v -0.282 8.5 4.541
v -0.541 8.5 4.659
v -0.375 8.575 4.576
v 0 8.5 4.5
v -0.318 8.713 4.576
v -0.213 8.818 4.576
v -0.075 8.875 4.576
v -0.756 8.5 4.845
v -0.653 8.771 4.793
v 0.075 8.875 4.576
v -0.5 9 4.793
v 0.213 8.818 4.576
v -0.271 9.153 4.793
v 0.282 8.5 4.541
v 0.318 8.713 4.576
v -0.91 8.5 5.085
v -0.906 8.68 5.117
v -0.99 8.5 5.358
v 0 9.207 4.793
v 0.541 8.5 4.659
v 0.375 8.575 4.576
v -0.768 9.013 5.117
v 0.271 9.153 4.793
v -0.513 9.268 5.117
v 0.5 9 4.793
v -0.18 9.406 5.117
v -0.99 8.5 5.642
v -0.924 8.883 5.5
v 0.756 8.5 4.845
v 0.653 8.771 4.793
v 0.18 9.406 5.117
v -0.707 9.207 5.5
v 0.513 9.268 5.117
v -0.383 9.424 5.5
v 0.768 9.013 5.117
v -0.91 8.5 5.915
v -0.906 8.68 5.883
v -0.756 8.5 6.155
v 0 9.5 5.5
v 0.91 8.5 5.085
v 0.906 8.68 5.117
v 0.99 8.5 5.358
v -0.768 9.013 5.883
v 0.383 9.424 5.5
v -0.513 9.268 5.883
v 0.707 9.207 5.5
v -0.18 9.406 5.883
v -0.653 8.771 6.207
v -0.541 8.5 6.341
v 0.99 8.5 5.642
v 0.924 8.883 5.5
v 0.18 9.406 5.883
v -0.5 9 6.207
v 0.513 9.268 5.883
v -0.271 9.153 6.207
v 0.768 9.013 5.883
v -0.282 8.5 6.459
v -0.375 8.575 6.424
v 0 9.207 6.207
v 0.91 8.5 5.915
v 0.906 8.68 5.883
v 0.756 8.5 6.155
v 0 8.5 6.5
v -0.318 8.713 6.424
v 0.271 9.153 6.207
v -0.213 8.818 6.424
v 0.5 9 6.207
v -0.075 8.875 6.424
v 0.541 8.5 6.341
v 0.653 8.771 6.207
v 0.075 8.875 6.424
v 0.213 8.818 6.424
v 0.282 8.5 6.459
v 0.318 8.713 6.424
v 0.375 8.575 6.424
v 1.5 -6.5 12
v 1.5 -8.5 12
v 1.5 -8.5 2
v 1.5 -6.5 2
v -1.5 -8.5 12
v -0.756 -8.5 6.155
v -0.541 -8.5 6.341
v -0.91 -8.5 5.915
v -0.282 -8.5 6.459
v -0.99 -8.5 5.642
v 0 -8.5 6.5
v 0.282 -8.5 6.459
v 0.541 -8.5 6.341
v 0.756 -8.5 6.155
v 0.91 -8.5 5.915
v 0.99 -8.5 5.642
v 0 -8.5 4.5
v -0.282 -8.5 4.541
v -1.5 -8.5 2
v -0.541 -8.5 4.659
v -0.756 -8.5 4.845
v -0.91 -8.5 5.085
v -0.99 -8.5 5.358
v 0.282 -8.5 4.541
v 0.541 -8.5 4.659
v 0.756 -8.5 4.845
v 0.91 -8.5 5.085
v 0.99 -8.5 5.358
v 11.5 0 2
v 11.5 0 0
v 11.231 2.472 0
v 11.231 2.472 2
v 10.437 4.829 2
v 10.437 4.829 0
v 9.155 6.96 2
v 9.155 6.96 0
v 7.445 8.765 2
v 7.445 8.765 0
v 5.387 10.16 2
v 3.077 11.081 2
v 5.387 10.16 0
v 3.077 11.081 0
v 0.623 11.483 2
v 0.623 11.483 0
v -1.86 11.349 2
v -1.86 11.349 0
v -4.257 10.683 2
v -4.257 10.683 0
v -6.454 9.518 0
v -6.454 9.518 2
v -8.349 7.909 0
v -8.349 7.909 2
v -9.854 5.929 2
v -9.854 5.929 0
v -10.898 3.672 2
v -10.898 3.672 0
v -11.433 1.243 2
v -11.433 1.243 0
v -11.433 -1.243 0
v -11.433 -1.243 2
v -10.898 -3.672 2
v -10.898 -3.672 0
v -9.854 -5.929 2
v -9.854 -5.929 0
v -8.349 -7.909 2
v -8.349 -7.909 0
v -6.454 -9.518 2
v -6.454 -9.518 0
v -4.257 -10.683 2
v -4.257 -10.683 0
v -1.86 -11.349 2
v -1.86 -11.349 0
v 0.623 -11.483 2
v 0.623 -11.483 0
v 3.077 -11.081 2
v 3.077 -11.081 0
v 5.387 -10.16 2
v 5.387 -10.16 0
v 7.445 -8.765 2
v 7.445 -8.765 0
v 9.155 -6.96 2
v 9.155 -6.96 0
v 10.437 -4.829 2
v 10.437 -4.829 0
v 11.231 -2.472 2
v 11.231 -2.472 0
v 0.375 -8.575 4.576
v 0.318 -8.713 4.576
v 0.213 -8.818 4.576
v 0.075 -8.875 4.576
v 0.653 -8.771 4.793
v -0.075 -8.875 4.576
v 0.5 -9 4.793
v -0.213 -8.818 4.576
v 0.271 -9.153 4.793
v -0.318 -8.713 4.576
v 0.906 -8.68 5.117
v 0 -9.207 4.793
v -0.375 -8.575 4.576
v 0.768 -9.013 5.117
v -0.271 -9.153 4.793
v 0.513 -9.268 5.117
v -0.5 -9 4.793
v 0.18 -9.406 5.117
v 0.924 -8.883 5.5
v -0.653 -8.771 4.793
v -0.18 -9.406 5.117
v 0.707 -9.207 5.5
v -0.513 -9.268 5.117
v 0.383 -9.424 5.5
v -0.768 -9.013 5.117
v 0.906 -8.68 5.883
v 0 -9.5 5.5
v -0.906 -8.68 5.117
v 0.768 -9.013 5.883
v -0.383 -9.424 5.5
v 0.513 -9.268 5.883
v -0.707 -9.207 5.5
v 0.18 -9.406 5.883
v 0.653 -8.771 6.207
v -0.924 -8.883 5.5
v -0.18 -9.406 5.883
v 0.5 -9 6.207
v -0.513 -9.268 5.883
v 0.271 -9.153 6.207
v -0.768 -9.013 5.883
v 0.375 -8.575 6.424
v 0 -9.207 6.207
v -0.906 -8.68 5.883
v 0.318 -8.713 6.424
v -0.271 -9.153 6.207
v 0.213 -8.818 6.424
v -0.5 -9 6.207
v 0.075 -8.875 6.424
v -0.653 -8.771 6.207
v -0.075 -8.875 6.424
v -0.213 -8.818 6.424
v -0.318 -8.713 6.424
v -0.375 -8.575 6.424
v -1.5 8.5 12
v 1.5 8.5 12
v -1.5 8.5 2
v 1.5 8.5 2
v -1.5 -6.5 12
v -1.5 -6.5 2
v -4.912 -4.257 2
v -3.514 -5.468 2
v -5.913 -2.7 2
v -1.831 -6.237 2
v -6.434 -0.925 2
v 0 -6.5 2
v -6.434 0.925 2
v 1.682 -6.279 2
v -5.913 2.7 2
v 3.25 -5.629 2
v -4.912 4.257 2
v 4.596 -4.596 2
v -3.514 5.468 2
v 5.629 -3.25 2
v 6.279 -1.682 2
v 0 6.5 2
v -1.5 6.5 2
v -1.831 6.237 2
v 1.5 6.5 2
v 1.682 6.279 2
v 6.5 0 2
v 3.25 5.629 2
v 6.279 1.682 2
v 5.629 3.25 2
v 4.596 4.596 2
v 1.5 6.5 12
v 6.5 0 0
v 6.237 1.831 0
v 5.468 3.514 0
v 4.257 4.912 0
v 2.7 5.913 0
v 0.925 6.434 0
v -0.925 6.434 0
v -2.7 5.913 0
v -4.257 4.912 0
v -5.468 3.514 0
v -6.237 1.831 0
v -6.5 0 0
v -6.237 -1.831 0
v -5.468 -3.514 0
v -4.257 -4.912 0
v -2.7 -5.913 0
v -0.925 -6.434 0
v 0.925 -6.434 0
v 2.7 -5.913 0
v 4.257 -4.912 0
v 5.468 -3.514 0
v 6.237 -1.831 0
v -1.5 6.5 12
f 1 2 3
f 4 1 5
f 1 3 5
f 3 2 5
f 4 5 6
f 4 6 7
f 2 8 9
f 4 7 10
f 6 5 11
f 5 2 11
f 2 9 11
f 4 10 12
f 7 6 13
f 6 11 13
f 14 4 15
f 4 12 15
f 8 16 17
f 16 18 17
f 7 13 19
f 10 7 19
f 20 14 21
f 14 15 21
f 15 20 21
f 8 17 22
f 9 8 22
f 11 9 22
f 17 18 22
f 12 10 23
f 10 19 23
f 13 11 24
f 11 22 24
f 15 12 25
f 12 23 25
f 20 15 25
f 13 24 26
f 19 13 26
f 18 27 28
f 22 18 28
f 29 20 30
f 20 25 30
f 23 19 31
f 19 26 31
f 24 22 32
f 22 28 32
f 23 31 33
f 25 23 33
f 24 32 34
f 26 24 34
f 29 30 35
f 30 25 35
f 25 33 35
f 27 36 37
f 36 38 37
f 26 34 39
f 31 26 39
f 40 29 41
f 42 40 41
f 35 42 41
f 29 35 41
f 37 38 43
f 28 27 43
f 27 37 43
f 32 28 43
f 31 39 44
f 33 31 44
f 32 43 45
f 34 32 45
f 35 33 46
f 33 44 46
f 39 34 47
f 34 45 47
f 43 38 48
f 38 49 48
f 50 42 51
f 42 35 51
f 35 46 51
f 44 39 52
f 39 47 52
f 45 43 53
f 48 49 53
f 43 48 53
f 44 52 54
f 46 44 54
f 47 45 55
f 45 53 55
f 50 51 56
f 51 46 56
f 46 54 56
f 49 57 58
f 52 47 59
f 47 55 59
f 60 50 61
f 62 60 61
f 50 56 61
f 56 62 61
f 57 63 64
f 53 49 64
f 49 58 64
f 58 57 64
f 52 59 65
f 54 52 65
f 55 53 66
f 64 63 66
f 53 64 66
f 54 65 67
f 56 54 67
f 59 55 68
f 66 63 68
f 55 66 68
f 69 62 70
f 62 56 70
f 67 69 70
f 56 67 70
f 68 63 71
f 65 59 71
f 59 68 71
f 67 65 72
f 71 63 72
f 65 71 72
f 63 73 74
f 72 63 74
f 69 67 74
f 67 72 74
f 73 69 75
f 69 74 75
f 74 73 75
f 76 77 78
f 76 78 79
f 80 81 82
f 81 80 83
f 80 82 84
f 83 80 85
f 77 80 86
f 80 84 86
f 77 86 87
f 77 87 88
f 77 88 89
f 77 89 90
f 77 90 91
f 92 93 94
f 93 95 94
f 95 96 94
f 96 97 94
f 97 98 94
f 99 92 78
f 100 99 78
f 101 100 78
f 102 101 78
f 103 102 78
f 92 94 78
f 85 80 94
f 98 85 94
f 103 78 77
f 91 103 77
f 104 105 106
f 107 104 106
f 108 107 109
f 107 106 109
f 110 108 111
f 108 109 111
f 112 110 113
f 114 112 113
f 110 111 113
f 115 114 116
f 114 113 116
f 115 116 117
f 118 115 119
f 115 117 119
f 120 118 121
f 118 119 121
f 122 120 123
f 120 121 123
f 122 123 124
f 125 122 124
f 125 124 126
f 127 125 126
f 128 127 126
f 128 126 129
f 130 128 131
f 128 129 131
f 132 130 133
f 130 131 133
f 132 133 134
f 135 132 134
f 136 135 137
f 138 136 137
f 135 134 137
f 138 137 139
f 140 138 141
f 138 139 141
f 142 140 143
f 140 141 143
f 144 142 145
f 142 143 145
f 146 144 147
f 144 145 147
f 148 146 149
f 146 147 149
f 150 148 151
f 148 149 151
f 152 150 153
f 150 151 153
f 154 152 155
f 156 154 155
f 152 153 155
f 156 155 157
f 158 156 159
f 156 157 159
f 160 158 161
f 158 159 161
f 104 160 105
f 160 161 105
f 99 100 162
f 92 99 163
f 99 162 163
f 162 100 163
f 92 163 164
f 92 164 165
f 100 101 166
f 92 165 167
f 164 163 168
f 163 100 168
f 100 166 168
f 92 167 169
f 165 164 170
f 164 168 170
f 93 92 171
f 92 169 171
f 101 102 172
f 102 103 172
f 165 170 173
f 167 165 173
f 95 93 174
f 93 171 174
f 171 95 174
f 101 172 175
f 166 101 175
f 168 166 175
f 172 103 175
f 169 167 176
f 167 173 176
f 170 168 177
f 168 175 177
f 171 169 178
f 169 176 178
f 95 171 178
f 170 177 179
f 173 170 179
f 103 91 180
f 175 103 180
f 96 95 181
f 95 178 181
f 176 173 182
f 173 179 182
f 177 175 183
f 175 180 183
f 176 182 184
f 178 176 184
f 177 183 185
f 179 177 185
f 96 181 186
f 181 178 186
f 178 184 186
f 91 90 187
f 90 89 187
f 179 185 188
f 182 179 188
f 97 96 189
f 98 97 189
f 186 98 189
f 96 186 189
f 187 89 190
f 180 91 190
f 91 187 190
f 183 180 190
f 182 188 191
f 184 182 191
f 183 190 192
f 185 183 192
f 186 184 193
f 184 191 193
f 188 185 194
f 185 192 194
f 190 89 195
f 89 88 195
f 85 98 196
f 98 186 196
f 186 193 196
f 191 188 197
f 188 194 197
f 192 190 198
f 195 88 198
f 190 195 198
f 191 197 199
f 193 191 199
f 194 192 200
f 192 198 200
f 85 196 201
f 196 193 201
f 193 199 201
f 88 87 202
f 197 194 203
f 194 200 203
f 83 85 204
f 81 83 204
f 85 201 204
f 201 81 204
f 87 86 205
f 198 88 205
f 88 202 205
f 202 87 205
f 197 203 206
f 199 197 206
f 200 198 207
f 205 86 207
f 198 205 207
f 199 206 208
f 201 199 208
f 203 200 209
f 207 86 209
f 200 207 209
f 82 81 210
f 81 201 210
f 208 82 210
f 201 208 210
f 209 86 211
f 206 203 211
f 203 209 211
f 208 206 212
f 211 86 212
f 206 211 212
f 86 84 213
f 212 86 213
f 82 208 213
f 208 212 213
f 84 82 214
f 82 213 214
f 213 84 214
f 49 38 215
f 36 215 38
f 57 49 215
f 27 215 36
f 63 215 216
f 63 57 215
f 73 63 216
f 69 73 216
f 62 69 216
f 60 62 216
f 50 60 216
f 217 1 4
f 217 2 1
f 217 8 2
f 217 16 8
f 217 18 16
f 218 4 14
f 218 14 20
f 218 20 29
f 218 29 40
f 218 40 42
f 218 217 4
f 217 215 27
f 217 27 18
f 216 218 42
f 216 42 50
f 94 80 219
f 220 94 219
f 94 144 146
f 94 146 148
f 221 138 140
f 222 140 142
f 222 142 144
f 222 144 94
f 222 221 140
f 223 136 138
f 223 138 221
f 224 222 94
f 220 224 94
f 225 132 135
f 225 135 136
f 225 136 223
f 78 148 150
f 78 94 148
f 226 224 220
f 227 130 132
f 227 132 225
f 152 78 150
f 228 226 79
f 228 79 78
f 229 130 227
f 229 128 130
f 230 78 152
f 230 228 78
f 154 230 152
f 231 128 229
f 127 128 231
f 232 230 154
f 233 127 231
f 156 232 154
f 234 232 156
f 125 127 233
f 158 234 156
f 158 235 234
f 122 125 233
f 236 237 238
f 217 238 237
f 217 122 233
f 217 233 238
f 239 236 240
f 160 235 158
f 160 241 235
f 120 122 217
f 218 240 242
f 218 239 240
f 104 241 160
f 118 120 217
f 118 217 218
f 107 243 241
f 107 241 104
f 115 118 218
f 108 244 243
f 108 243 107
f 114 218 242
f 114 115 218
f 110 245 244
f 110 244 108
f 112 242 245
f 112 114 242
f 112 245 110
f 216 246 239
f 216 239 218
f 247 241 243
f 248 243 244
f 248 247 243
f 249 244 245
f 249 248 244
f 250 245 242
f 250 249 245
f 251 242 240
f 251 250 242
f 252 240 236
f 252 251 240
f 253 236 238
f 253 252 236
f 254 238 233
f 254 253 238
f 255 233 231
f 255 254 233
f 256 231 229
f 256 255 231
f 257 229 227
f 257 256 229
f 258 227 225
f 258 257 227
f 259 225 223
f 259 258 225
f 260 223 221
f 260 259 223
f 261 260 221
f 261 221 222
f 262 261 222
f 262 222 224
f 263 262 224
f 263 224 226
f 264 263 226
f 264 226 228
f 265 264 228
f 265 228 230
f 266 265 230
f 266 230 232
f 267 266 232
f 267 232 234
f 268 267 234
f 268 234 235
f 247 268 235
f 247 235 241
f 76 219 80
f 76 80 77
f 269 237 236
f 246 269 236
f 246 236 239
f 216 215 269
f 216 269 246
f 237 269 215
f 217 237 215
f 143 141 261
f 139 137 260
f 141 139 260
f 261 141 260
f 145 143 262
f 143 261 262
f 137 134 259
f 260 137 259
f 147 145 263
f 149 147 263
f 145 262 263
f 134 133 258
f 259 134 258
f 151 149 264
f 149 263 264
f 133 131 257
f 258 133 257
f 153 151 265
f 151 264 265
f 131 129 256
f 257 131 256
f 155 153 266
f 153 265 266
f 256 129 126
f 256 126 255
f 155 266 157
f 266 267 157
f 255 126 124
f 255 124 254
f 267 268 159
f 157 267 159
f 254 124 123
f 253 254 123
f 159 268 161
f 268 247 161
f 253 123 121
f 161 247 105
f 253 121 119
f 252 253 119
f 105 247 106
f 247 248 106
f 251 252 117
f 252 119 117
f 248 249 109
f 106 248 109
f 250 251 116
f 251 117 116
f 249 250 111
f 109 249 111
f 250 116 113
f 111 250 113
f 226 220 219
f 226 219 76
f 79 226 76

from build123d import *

# Parameters (mm, degrees)
SKETCH150_R         = 11.5
SKETCH150_R_2       = 6.5
PAD061_DEPTH        = 2
SKETCH151_W         = 3
SKETCH151_H         = 2
PAD062_DEPTH        = 10
REVOLUTION013_ANGLE = -180
REVOLUTION014_ANGLE = -180


with BuildPart() as part:
    # Sketch150 → Pad061 (new body)
    with BuildSketch(Plane.XY):
        Circle(SKETCH150_R)
        Circle(SKETCH150_R_2, mode=Mode.SUBTRACT)
    extrude(amount=PAD061_DEPTH)

    # Sketch151 (on Face4 of Pad061) → Pad062 (join)
    with BuildSketch(Plane.XY.offset(2)):
        with Locations((0, 7.5)):
            Rectangle(SKETCH151_W, SKETCH151_H)
        with Locations((0, -7.5)):
            Rectangle(SKETCH151_W, SKETCH151_H)
    extrude(amount=PAD062_DEPTH)

    # Sketch152 (on Face11 of Pad062) → Revolution013 (revolve)
    with BuildSketch(Plane.XZ.offset(8.5)):
        with BuildLine():
            ThreePointArc((0, 4.5), (1, 5.5), (0, 6.5))
            Line((0, 6.5), (0, 4.5))
        make_face()
    revolve(axis=Axis((0, -8.5, 0), (0, 0, 1)), revolution_arc=REVOLUTION013_ANGLE)

    # Sketch153 (on Face7 of Revolution013) → Revolution014 (revolve)
    with BuildSketch(Plane(origin=(0, 8.5, 0), x_dir=(-1, 0, 0), z_dir=(0, 1, 0))):
        with BuildLine():
            ThreePointArc((0, 4.5), (1, 5.5), (0, 6.5))
            Line((0, 6.5), (0, 4.5))
        make_face()
    revolve(axis=Axis((0, 8.5, 0), (0, 0, 1)), revolution_arc=REVOLUTION014_ANGLE)


solid = part.part
